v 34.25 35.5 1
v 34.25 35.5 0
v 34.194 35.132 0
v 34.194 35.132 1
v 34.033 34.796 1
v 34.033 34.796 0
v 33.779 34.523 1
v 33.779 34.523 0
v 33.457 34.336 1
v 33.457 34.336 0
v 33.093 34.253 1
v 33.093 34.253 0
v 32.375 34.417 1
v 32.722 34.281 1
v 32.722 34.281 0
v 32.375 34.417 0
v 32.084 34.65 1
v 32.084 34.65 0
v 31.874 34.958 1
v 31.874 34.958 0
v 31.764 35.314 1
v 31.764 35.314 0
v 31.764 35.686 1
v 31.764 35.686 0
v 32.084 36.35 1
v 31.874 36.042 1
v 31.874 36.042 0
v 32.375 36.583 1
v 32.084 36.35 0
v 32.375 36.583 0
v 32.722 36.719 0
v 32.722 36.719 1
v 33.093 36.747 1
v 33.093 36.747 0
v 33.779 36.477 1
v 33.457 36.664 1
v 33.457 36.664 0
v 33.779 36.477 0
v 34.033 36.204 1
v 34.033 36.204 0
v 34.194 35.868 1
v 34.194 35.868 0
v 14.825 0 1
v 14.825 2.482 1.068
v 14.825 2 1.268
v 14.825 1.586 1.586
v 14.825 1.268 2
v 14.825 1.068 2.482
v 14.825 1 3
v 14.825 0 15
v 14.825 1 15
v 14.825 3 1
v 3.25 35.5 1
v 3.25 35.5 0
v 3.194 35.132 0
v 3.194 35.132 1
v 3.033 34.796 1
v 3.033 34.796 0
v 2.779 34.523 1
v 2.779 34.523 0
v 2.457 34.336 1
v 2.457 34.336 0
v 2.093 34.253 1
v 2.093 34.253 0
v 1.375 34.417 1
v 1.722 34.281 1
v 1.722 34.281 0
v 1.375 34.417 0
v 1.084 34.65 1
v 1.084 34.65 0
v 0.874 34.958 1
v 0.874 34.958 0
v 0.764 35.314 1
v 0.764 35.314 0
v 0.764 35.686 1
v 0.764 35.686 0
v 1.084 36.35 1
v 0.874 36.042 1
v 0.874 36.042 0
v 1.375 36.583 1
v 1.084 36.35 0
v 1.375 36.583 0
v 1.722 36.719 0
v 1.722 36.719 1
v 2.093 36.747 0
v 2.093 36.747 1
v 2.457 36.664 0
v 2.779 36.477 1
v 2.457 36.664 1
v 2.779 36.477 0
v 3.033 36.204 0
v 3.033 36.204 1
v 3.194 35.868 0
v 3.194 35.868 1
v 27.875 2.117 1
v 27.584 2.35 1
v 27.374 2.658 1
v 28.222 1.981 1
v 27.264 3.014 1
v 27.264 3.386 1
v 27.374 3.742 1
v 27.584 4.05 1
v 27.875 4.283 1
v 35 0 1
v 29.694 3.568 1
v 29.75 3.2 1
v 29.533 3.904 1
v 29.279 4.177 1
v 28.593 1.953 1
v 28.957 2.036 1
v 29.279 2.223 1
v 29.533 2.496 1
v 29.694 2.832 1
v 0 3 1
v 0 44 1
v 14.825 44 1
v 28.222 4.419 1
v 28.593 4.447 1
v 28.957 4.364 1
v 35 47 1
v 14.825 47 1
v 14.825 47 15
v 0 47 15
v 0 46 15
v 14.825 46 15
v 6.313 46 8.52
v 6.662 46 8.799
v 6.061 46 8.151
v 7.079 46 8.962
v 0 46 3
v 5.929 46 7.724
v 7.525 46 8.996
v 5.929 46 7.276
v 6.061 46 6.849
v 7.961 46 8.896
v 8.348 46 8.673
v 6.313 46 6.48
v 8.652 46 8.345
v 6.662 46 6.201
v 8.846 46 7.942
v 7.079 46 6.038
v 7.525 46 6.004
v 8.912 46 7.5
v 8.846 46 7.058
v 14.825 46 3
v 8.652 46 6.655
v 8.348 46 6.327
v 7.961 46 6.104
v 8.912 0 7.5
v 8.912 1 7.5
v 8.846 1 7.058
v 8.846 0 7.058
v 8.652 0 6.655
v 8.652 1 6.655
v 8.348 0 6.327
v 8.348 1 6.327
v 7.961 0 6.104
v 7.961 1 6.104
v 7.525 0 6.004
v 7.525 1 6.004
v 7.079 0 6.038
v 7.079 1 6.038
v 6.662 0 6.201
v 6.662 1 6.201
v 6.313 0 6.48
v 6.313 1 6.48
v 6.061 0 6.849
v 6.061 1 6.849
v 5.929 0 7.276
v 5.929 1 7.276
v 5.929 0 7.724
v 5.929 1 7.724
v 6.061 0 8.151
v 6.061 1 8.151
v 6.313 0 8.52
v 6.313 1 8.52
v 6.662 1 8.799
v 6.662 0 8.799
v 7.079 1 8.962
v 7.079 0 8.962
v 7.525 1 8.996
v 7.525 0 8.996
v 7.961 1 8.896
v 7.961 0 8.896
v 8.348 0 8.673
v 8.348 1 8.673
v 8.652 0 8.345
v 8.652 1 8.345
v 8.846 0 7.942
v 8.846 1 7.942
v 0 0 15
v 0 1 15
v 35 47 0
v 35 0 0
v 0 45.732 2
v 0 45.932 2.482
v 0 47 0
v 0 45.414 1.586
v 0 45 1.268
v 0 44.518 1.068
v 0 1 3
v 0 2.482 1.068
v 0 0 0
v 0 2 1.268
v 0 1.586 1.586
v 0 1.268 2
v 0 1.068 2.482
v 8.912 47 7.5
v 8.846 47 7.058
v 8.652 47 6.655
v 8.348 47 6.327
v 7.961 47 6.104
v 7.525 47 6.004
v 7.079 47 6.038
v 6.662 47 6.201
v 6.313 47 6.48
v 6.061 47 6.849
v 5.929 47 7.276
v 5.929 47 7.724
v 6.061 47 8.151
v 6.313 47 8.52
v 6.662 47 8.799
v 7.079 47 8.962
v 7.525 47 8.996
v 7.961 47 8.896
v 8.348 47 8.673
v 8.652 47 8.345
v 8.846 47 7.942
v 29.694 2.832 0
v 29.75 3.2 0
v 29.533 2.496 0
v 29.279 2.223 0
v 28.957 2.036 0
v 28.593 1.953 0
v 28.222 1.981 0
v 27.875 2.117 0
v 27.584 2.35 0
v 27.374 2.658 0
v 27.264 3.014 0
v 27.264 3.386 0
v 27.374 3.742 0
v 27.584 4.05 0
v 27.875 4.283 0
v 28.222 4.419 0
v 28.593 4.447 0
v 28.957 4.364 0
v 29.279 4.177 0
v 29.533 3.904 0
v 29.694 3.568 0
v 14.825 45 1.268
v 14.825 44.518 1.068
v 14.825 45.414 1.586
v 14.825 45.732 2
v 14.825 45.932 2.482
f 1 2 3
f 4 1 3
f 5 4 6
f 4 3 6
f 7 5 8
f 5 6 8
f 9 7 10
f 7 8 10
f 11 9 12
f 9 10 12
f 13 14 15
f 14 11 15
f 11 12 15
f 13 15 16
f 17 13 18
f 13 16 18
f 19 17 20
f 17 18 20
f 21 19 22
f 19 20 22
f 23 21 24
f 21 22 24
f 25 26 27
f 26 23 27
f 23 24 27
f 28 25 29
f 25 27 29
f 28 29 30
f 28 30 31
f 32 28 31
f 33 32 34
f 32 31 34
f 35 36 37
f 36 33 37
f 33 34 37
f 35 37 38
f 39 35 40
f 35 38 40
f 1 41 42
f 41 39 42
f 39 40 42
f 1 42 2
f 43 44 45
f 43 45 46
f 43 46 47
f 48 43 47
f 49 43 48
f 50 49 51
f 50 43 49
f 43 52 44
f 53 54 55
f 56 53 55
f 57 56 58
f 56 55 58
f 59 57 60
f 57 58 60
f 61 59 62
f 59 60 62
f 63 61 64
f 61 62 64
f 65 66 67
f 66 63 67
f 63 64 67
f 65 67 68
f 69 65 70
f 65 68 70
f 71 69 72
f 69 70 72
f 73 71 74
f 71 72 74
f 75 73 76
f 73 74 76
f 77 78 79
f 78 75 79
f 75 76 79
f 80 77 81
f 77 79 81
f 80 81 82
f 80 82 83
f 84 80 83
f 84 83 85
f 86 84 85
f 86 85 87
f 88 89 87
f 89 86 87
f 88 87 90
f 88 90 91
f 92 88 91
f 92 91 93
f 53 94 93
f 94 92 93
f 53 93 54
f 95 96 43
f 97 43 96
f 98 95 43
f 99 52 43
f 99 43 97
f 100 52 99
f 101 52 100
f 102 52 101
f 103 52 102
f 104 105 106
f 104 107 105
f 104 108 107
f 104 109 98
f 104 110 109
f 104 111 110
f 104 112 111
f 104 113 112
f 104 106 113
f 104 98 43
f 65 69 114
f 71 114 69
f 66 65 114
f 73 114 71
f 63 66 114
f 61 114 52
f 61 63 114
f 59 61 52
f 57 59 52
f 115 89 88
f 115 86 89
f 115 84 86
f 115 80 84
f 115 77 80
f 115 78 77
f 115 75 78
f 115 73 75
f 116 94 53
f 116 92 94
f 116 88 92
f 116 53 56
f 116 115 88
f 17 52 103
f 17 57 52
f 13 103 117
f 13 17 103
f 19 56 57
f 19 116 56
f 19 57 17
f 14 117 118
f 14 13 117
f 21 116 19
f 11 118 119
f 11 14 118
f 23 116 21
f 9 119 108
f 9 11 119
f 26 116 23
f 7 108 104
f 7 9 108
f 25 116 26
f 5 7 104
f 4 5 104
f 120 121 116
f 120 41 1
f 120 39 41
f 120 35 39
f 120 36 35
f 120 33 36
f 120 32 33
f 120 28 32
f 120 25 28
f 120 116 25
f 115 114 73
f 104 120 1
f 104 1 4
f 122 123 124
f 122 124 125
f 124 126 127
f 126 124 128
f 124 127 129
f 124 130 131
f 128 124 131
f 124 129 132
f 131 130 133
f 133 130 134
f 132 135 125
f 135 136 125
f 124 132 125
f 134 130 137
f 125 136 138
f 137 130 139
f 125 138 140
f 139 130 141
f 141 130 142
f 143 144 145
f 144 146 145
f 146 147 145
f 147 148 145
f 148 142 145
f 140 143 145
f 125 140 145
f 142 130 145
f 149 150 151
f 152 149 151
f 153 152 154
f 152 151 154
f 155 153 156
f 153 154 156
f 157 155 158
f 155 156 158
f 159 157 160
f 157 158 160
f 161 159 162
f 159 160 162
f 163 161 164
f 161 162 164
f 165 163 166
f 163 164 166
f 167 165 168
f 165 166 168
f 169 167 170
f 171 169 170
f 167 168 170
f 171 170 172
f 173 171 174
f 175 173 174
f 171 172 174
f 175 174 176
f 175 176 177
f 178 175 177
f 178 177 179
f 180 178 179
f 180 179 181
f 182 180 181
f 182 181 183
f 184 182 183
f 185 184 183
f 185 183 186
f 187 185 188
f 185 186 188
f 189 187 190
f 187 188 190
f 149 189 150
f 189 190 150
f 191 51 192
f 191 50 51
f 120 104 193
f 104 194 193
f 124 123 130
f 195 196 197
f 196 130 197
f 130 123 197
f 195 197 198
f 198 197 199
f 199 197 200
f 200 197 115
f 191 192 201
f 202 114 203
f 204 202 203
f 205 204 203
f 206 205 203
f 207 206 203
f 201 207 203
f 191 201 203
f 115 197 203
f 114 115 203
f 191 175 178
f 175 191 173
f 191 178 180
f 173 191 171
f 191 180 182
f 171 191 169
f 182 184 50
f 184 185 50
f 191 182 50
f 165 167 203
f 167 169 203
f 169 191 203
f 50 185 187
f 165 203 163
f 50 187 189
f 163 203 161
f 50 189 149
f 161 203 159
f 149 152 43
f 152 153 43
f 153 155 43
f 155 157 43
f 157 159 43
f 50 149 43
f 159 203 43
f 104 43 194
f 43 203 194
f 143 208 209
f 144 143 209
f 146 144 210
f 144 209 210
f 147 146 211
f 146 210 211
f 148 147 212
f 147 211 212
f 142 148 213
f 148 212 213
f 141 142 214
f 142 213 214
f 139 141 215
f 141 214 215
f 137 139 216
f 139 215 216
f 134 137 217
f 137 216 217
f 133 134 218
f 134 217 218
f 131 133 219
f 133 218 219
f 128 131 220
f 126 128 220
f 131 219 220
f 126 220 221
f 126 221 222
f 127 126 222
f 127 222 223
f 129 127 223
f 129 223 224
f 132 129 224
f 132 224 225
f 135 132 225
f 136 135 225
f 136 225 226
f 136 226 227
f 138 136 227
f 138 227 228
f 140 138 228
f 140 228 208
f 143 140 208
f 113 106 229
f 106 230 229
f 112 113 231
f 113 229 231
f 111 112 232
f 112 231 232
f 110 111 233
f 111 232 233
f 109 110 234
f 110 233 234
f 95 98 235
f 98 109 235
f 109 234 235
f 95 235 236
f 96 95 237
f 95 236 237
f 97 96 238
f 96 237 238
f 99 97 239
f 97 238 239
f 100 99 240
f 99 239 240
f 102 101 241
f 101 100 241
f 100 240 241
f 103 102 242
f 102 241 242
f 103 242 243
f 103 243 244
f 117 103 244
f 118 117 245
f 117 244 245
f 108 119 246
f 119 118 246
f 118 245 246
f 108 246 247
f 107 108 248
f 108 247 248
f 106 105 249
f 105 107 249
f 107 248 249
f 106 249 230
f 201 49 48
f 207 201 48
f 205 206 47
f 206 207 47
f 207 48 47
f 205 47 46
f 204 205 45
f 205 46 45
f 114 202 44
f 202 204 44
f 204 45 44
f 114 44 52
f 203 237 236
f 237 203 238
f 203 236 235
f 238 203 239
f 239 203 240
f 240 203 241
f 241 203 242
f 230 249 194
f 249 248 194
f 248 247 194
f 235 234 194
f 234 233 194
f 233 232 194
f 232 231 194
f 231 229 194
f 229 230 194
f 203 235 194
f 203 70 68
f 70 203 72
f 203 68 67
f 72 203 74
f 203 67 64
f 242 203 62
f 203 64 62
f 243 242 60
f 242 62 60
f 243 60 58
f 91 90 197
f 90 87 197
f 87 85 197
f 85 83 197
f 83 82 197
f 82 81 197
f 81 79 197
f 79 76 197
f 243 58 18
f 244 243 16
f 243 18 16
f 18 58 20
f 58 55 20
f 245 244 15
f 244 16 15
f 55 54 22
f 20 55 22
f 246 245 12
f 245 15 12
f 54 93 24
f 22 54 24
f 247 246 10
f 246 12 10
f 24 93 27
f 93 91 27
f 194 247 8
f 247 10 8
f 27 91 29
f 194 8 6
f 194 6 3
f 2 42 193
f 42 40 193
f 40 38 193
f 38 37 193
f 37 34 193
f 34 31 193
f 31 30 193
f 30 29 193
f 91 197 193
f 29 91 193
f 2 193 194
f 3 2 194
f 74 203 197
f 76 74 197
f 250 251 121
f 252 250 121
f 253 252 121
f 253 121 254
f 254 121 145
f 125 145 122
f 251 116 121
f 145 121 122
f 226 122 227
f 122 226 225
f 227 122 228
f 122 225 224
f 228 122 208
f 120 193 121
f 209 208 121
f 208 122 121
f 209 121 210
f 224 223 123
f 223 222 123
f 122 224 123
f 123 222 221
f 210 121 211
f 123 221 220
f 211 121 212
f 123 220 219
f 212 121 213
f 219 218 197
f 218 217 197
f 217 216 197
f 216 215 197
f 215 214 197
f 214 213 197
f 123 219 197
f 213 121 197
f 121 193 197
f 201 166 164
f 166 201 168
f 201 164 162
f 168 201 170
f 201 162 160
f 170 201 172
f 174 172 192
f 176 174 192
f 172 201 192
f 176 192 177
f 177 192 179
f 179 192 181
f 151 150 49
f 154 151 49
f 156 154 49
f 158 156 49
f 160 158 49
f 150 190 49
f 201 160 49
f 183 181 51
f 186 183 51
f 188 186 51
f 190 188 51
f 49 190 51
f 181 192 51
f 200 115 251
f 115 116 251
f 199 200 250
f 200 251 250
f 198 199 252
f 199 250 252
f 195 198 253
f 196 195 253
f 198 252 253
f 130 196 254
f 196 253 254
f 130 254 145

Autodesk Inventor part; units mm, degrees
ref_plane "YZ Plane" through (0, 0, 0) normal (1, 0, 0) x (0, 1, 0)
ref_plane "XZ Plane" through (0, 0, 0) normal (0, 1, 0) x (-1, 0, 0)
ref_plane "XY Plane" through (0, 0, 0) normal (0, 0, 1) x (1, 0, 0)
sketch "Sketch12" plane through (0, 0, 0) normal (0, 0, 1) x (1, 0, 0)
  line L0 (0, 0) -> (35, 0)
  line L1 (35, 0) -> (35, 47)
  line L2 (35, 47) -> (0, 47)
  line L3 (0, 47) -> (0, 0)
  line L4 (0, 47) -> (2, 47) construction
  line L5 (2, 47) -> (2, 35.5) construction
  line L6 (35, 47) -> (33, 47) construction
  line L7 (33, 47) -> (33, 35.5) construction
  circle A0 centre (33, 35.5) radius 1.25
  circle A1 centre (2, 35.5) radius 1.25
  line L8 (0, 0) -> (6.5, 0) construction
  line L9 (35, 0) -> (28.5, 0) construction
  line L10 (6.5, 0) -> (6.5, 3.2) construction
  line L11 (28.5, 0) -> (28.5, 3.2) construction
  circle A2 centre (28.5, 3.2) radius 1.25
  dimension "d49" = 35
  dimension "d50" = 47
  dimension "d97" = 2
  dimension "d98" = 11.5
  dimension "d99" = 2
  dimension "d100" = 2.5
  dimension "d101" = 2.5
  dimension "d102" = 11.5
  dimension "d103" = 6.5
  dimension "d104" = 6.5
  dimension "d105" = 3.2
  dimension "d106" = 3.2
  dimension "d108" = 2.5
extrude "Extrusión8" add sketch "Sketch12" along normal blind 1
sketch "Sketch25" plane through (0, 47, 0) normal (0, 1, 0) x (1, 0, 0)
  point P0 (0, 0)
sketch "Sketch26" plane through (0, 0, 0) normal (0, -1, 0) x (1, 0, 0)
  line L0 (35, 1) -> (20.1754, 1)
  line L1 (20.1754, 1) -> (20.1754, 15)
  line L2 (20.1754, 15) -> (35, 15)
  line L3 (35, 15) -> (35, 1)
  line L4 (0, 1) -> (14.825, 1)
  line L5 (35, 1) -> (0, 1) projected
  line L6 (14.825, 1) -> (14.825, 15)
  line L7 (14.825, 15) -> (0, 15)
  line L8 (0, 15) -> (0, 1)
  point P0 (0, 0)
  dimension "d121" = 14.825
  dimension "d126" = 14
extrude "Extrusion10" add sketch "Sketch26" against normal blind 1 contours L4 L8 L7 L6
fillet "Empalme1" radius 2 1 edges at (7.4125, 1, 1)
sketch "Boceto28" plane through (0, 47, 0) normal (0, 1, 0) x (1, 0, 0)
  line L0 (0, 0) -> (0, -1) projected
  line L1 (0, -1) -> (14.825, -1)
  line L2 (0, -3) -> (14.825, -3) projected
  line L3 (14.825, -15) -> (14.825, -3) projected
  line L4 (14.825, -1) -> (14.825, -15)
  line L5 (0, -15) -> (14.825, -15) projected
  line L6 (14.825, -15) -> (0, -15)
  line L7 (0, -15) -> (0, -1)
  point P0 (14.825, -3)
extrude "Extrusión12" add sketch "Boceto28" against normal blind 1
fillet "Empalme2" radius 2 1 edges at (7.4125, 46, 1)
sketch "Boceto29" plane through (0, 47, 0) normal (0, 1, 0) x (1, 0, 0)
  line L0 (0, 0) -> (0, -15) projected
  line L1 (0, -7.5) -> (14.825, -7.5)
  line L2 (14.825, -15) -> (14.825, -3) projected
  line L3 (7.4125, -7.5) -> (7.4125, -15)
  line L4 (0, -15) -> (14.825, -15) projected
  circle A0 centre (7.4125, -7.5) radius 1.5
  dimension "d127" = 3
extrude "Extrusión13" cut sketch "Boceto29" against normal through all contours A0 L1 | L1 L3 A0 | L1 A0 L3
equation "\"BendRadius\" = Thickness"
equation "\"BendReliefWidth\" = Thickness"
equation "\"BendReliefDepth\" = 0.5 * Thickness"
equation "\"CornerReliefSize\" = 4 * Thickness"
equation "\"MinimumRemnant\" = 2 * Thickness"
equation "\"TransitionRadius\" = BendRadius"
equation "\"JacobiRadiusSize\" = BendRadius"
equation "\"GapSize\" = Thickness"
equation "\"Thickness\" = 1"
properties part number "Suportmotor"
